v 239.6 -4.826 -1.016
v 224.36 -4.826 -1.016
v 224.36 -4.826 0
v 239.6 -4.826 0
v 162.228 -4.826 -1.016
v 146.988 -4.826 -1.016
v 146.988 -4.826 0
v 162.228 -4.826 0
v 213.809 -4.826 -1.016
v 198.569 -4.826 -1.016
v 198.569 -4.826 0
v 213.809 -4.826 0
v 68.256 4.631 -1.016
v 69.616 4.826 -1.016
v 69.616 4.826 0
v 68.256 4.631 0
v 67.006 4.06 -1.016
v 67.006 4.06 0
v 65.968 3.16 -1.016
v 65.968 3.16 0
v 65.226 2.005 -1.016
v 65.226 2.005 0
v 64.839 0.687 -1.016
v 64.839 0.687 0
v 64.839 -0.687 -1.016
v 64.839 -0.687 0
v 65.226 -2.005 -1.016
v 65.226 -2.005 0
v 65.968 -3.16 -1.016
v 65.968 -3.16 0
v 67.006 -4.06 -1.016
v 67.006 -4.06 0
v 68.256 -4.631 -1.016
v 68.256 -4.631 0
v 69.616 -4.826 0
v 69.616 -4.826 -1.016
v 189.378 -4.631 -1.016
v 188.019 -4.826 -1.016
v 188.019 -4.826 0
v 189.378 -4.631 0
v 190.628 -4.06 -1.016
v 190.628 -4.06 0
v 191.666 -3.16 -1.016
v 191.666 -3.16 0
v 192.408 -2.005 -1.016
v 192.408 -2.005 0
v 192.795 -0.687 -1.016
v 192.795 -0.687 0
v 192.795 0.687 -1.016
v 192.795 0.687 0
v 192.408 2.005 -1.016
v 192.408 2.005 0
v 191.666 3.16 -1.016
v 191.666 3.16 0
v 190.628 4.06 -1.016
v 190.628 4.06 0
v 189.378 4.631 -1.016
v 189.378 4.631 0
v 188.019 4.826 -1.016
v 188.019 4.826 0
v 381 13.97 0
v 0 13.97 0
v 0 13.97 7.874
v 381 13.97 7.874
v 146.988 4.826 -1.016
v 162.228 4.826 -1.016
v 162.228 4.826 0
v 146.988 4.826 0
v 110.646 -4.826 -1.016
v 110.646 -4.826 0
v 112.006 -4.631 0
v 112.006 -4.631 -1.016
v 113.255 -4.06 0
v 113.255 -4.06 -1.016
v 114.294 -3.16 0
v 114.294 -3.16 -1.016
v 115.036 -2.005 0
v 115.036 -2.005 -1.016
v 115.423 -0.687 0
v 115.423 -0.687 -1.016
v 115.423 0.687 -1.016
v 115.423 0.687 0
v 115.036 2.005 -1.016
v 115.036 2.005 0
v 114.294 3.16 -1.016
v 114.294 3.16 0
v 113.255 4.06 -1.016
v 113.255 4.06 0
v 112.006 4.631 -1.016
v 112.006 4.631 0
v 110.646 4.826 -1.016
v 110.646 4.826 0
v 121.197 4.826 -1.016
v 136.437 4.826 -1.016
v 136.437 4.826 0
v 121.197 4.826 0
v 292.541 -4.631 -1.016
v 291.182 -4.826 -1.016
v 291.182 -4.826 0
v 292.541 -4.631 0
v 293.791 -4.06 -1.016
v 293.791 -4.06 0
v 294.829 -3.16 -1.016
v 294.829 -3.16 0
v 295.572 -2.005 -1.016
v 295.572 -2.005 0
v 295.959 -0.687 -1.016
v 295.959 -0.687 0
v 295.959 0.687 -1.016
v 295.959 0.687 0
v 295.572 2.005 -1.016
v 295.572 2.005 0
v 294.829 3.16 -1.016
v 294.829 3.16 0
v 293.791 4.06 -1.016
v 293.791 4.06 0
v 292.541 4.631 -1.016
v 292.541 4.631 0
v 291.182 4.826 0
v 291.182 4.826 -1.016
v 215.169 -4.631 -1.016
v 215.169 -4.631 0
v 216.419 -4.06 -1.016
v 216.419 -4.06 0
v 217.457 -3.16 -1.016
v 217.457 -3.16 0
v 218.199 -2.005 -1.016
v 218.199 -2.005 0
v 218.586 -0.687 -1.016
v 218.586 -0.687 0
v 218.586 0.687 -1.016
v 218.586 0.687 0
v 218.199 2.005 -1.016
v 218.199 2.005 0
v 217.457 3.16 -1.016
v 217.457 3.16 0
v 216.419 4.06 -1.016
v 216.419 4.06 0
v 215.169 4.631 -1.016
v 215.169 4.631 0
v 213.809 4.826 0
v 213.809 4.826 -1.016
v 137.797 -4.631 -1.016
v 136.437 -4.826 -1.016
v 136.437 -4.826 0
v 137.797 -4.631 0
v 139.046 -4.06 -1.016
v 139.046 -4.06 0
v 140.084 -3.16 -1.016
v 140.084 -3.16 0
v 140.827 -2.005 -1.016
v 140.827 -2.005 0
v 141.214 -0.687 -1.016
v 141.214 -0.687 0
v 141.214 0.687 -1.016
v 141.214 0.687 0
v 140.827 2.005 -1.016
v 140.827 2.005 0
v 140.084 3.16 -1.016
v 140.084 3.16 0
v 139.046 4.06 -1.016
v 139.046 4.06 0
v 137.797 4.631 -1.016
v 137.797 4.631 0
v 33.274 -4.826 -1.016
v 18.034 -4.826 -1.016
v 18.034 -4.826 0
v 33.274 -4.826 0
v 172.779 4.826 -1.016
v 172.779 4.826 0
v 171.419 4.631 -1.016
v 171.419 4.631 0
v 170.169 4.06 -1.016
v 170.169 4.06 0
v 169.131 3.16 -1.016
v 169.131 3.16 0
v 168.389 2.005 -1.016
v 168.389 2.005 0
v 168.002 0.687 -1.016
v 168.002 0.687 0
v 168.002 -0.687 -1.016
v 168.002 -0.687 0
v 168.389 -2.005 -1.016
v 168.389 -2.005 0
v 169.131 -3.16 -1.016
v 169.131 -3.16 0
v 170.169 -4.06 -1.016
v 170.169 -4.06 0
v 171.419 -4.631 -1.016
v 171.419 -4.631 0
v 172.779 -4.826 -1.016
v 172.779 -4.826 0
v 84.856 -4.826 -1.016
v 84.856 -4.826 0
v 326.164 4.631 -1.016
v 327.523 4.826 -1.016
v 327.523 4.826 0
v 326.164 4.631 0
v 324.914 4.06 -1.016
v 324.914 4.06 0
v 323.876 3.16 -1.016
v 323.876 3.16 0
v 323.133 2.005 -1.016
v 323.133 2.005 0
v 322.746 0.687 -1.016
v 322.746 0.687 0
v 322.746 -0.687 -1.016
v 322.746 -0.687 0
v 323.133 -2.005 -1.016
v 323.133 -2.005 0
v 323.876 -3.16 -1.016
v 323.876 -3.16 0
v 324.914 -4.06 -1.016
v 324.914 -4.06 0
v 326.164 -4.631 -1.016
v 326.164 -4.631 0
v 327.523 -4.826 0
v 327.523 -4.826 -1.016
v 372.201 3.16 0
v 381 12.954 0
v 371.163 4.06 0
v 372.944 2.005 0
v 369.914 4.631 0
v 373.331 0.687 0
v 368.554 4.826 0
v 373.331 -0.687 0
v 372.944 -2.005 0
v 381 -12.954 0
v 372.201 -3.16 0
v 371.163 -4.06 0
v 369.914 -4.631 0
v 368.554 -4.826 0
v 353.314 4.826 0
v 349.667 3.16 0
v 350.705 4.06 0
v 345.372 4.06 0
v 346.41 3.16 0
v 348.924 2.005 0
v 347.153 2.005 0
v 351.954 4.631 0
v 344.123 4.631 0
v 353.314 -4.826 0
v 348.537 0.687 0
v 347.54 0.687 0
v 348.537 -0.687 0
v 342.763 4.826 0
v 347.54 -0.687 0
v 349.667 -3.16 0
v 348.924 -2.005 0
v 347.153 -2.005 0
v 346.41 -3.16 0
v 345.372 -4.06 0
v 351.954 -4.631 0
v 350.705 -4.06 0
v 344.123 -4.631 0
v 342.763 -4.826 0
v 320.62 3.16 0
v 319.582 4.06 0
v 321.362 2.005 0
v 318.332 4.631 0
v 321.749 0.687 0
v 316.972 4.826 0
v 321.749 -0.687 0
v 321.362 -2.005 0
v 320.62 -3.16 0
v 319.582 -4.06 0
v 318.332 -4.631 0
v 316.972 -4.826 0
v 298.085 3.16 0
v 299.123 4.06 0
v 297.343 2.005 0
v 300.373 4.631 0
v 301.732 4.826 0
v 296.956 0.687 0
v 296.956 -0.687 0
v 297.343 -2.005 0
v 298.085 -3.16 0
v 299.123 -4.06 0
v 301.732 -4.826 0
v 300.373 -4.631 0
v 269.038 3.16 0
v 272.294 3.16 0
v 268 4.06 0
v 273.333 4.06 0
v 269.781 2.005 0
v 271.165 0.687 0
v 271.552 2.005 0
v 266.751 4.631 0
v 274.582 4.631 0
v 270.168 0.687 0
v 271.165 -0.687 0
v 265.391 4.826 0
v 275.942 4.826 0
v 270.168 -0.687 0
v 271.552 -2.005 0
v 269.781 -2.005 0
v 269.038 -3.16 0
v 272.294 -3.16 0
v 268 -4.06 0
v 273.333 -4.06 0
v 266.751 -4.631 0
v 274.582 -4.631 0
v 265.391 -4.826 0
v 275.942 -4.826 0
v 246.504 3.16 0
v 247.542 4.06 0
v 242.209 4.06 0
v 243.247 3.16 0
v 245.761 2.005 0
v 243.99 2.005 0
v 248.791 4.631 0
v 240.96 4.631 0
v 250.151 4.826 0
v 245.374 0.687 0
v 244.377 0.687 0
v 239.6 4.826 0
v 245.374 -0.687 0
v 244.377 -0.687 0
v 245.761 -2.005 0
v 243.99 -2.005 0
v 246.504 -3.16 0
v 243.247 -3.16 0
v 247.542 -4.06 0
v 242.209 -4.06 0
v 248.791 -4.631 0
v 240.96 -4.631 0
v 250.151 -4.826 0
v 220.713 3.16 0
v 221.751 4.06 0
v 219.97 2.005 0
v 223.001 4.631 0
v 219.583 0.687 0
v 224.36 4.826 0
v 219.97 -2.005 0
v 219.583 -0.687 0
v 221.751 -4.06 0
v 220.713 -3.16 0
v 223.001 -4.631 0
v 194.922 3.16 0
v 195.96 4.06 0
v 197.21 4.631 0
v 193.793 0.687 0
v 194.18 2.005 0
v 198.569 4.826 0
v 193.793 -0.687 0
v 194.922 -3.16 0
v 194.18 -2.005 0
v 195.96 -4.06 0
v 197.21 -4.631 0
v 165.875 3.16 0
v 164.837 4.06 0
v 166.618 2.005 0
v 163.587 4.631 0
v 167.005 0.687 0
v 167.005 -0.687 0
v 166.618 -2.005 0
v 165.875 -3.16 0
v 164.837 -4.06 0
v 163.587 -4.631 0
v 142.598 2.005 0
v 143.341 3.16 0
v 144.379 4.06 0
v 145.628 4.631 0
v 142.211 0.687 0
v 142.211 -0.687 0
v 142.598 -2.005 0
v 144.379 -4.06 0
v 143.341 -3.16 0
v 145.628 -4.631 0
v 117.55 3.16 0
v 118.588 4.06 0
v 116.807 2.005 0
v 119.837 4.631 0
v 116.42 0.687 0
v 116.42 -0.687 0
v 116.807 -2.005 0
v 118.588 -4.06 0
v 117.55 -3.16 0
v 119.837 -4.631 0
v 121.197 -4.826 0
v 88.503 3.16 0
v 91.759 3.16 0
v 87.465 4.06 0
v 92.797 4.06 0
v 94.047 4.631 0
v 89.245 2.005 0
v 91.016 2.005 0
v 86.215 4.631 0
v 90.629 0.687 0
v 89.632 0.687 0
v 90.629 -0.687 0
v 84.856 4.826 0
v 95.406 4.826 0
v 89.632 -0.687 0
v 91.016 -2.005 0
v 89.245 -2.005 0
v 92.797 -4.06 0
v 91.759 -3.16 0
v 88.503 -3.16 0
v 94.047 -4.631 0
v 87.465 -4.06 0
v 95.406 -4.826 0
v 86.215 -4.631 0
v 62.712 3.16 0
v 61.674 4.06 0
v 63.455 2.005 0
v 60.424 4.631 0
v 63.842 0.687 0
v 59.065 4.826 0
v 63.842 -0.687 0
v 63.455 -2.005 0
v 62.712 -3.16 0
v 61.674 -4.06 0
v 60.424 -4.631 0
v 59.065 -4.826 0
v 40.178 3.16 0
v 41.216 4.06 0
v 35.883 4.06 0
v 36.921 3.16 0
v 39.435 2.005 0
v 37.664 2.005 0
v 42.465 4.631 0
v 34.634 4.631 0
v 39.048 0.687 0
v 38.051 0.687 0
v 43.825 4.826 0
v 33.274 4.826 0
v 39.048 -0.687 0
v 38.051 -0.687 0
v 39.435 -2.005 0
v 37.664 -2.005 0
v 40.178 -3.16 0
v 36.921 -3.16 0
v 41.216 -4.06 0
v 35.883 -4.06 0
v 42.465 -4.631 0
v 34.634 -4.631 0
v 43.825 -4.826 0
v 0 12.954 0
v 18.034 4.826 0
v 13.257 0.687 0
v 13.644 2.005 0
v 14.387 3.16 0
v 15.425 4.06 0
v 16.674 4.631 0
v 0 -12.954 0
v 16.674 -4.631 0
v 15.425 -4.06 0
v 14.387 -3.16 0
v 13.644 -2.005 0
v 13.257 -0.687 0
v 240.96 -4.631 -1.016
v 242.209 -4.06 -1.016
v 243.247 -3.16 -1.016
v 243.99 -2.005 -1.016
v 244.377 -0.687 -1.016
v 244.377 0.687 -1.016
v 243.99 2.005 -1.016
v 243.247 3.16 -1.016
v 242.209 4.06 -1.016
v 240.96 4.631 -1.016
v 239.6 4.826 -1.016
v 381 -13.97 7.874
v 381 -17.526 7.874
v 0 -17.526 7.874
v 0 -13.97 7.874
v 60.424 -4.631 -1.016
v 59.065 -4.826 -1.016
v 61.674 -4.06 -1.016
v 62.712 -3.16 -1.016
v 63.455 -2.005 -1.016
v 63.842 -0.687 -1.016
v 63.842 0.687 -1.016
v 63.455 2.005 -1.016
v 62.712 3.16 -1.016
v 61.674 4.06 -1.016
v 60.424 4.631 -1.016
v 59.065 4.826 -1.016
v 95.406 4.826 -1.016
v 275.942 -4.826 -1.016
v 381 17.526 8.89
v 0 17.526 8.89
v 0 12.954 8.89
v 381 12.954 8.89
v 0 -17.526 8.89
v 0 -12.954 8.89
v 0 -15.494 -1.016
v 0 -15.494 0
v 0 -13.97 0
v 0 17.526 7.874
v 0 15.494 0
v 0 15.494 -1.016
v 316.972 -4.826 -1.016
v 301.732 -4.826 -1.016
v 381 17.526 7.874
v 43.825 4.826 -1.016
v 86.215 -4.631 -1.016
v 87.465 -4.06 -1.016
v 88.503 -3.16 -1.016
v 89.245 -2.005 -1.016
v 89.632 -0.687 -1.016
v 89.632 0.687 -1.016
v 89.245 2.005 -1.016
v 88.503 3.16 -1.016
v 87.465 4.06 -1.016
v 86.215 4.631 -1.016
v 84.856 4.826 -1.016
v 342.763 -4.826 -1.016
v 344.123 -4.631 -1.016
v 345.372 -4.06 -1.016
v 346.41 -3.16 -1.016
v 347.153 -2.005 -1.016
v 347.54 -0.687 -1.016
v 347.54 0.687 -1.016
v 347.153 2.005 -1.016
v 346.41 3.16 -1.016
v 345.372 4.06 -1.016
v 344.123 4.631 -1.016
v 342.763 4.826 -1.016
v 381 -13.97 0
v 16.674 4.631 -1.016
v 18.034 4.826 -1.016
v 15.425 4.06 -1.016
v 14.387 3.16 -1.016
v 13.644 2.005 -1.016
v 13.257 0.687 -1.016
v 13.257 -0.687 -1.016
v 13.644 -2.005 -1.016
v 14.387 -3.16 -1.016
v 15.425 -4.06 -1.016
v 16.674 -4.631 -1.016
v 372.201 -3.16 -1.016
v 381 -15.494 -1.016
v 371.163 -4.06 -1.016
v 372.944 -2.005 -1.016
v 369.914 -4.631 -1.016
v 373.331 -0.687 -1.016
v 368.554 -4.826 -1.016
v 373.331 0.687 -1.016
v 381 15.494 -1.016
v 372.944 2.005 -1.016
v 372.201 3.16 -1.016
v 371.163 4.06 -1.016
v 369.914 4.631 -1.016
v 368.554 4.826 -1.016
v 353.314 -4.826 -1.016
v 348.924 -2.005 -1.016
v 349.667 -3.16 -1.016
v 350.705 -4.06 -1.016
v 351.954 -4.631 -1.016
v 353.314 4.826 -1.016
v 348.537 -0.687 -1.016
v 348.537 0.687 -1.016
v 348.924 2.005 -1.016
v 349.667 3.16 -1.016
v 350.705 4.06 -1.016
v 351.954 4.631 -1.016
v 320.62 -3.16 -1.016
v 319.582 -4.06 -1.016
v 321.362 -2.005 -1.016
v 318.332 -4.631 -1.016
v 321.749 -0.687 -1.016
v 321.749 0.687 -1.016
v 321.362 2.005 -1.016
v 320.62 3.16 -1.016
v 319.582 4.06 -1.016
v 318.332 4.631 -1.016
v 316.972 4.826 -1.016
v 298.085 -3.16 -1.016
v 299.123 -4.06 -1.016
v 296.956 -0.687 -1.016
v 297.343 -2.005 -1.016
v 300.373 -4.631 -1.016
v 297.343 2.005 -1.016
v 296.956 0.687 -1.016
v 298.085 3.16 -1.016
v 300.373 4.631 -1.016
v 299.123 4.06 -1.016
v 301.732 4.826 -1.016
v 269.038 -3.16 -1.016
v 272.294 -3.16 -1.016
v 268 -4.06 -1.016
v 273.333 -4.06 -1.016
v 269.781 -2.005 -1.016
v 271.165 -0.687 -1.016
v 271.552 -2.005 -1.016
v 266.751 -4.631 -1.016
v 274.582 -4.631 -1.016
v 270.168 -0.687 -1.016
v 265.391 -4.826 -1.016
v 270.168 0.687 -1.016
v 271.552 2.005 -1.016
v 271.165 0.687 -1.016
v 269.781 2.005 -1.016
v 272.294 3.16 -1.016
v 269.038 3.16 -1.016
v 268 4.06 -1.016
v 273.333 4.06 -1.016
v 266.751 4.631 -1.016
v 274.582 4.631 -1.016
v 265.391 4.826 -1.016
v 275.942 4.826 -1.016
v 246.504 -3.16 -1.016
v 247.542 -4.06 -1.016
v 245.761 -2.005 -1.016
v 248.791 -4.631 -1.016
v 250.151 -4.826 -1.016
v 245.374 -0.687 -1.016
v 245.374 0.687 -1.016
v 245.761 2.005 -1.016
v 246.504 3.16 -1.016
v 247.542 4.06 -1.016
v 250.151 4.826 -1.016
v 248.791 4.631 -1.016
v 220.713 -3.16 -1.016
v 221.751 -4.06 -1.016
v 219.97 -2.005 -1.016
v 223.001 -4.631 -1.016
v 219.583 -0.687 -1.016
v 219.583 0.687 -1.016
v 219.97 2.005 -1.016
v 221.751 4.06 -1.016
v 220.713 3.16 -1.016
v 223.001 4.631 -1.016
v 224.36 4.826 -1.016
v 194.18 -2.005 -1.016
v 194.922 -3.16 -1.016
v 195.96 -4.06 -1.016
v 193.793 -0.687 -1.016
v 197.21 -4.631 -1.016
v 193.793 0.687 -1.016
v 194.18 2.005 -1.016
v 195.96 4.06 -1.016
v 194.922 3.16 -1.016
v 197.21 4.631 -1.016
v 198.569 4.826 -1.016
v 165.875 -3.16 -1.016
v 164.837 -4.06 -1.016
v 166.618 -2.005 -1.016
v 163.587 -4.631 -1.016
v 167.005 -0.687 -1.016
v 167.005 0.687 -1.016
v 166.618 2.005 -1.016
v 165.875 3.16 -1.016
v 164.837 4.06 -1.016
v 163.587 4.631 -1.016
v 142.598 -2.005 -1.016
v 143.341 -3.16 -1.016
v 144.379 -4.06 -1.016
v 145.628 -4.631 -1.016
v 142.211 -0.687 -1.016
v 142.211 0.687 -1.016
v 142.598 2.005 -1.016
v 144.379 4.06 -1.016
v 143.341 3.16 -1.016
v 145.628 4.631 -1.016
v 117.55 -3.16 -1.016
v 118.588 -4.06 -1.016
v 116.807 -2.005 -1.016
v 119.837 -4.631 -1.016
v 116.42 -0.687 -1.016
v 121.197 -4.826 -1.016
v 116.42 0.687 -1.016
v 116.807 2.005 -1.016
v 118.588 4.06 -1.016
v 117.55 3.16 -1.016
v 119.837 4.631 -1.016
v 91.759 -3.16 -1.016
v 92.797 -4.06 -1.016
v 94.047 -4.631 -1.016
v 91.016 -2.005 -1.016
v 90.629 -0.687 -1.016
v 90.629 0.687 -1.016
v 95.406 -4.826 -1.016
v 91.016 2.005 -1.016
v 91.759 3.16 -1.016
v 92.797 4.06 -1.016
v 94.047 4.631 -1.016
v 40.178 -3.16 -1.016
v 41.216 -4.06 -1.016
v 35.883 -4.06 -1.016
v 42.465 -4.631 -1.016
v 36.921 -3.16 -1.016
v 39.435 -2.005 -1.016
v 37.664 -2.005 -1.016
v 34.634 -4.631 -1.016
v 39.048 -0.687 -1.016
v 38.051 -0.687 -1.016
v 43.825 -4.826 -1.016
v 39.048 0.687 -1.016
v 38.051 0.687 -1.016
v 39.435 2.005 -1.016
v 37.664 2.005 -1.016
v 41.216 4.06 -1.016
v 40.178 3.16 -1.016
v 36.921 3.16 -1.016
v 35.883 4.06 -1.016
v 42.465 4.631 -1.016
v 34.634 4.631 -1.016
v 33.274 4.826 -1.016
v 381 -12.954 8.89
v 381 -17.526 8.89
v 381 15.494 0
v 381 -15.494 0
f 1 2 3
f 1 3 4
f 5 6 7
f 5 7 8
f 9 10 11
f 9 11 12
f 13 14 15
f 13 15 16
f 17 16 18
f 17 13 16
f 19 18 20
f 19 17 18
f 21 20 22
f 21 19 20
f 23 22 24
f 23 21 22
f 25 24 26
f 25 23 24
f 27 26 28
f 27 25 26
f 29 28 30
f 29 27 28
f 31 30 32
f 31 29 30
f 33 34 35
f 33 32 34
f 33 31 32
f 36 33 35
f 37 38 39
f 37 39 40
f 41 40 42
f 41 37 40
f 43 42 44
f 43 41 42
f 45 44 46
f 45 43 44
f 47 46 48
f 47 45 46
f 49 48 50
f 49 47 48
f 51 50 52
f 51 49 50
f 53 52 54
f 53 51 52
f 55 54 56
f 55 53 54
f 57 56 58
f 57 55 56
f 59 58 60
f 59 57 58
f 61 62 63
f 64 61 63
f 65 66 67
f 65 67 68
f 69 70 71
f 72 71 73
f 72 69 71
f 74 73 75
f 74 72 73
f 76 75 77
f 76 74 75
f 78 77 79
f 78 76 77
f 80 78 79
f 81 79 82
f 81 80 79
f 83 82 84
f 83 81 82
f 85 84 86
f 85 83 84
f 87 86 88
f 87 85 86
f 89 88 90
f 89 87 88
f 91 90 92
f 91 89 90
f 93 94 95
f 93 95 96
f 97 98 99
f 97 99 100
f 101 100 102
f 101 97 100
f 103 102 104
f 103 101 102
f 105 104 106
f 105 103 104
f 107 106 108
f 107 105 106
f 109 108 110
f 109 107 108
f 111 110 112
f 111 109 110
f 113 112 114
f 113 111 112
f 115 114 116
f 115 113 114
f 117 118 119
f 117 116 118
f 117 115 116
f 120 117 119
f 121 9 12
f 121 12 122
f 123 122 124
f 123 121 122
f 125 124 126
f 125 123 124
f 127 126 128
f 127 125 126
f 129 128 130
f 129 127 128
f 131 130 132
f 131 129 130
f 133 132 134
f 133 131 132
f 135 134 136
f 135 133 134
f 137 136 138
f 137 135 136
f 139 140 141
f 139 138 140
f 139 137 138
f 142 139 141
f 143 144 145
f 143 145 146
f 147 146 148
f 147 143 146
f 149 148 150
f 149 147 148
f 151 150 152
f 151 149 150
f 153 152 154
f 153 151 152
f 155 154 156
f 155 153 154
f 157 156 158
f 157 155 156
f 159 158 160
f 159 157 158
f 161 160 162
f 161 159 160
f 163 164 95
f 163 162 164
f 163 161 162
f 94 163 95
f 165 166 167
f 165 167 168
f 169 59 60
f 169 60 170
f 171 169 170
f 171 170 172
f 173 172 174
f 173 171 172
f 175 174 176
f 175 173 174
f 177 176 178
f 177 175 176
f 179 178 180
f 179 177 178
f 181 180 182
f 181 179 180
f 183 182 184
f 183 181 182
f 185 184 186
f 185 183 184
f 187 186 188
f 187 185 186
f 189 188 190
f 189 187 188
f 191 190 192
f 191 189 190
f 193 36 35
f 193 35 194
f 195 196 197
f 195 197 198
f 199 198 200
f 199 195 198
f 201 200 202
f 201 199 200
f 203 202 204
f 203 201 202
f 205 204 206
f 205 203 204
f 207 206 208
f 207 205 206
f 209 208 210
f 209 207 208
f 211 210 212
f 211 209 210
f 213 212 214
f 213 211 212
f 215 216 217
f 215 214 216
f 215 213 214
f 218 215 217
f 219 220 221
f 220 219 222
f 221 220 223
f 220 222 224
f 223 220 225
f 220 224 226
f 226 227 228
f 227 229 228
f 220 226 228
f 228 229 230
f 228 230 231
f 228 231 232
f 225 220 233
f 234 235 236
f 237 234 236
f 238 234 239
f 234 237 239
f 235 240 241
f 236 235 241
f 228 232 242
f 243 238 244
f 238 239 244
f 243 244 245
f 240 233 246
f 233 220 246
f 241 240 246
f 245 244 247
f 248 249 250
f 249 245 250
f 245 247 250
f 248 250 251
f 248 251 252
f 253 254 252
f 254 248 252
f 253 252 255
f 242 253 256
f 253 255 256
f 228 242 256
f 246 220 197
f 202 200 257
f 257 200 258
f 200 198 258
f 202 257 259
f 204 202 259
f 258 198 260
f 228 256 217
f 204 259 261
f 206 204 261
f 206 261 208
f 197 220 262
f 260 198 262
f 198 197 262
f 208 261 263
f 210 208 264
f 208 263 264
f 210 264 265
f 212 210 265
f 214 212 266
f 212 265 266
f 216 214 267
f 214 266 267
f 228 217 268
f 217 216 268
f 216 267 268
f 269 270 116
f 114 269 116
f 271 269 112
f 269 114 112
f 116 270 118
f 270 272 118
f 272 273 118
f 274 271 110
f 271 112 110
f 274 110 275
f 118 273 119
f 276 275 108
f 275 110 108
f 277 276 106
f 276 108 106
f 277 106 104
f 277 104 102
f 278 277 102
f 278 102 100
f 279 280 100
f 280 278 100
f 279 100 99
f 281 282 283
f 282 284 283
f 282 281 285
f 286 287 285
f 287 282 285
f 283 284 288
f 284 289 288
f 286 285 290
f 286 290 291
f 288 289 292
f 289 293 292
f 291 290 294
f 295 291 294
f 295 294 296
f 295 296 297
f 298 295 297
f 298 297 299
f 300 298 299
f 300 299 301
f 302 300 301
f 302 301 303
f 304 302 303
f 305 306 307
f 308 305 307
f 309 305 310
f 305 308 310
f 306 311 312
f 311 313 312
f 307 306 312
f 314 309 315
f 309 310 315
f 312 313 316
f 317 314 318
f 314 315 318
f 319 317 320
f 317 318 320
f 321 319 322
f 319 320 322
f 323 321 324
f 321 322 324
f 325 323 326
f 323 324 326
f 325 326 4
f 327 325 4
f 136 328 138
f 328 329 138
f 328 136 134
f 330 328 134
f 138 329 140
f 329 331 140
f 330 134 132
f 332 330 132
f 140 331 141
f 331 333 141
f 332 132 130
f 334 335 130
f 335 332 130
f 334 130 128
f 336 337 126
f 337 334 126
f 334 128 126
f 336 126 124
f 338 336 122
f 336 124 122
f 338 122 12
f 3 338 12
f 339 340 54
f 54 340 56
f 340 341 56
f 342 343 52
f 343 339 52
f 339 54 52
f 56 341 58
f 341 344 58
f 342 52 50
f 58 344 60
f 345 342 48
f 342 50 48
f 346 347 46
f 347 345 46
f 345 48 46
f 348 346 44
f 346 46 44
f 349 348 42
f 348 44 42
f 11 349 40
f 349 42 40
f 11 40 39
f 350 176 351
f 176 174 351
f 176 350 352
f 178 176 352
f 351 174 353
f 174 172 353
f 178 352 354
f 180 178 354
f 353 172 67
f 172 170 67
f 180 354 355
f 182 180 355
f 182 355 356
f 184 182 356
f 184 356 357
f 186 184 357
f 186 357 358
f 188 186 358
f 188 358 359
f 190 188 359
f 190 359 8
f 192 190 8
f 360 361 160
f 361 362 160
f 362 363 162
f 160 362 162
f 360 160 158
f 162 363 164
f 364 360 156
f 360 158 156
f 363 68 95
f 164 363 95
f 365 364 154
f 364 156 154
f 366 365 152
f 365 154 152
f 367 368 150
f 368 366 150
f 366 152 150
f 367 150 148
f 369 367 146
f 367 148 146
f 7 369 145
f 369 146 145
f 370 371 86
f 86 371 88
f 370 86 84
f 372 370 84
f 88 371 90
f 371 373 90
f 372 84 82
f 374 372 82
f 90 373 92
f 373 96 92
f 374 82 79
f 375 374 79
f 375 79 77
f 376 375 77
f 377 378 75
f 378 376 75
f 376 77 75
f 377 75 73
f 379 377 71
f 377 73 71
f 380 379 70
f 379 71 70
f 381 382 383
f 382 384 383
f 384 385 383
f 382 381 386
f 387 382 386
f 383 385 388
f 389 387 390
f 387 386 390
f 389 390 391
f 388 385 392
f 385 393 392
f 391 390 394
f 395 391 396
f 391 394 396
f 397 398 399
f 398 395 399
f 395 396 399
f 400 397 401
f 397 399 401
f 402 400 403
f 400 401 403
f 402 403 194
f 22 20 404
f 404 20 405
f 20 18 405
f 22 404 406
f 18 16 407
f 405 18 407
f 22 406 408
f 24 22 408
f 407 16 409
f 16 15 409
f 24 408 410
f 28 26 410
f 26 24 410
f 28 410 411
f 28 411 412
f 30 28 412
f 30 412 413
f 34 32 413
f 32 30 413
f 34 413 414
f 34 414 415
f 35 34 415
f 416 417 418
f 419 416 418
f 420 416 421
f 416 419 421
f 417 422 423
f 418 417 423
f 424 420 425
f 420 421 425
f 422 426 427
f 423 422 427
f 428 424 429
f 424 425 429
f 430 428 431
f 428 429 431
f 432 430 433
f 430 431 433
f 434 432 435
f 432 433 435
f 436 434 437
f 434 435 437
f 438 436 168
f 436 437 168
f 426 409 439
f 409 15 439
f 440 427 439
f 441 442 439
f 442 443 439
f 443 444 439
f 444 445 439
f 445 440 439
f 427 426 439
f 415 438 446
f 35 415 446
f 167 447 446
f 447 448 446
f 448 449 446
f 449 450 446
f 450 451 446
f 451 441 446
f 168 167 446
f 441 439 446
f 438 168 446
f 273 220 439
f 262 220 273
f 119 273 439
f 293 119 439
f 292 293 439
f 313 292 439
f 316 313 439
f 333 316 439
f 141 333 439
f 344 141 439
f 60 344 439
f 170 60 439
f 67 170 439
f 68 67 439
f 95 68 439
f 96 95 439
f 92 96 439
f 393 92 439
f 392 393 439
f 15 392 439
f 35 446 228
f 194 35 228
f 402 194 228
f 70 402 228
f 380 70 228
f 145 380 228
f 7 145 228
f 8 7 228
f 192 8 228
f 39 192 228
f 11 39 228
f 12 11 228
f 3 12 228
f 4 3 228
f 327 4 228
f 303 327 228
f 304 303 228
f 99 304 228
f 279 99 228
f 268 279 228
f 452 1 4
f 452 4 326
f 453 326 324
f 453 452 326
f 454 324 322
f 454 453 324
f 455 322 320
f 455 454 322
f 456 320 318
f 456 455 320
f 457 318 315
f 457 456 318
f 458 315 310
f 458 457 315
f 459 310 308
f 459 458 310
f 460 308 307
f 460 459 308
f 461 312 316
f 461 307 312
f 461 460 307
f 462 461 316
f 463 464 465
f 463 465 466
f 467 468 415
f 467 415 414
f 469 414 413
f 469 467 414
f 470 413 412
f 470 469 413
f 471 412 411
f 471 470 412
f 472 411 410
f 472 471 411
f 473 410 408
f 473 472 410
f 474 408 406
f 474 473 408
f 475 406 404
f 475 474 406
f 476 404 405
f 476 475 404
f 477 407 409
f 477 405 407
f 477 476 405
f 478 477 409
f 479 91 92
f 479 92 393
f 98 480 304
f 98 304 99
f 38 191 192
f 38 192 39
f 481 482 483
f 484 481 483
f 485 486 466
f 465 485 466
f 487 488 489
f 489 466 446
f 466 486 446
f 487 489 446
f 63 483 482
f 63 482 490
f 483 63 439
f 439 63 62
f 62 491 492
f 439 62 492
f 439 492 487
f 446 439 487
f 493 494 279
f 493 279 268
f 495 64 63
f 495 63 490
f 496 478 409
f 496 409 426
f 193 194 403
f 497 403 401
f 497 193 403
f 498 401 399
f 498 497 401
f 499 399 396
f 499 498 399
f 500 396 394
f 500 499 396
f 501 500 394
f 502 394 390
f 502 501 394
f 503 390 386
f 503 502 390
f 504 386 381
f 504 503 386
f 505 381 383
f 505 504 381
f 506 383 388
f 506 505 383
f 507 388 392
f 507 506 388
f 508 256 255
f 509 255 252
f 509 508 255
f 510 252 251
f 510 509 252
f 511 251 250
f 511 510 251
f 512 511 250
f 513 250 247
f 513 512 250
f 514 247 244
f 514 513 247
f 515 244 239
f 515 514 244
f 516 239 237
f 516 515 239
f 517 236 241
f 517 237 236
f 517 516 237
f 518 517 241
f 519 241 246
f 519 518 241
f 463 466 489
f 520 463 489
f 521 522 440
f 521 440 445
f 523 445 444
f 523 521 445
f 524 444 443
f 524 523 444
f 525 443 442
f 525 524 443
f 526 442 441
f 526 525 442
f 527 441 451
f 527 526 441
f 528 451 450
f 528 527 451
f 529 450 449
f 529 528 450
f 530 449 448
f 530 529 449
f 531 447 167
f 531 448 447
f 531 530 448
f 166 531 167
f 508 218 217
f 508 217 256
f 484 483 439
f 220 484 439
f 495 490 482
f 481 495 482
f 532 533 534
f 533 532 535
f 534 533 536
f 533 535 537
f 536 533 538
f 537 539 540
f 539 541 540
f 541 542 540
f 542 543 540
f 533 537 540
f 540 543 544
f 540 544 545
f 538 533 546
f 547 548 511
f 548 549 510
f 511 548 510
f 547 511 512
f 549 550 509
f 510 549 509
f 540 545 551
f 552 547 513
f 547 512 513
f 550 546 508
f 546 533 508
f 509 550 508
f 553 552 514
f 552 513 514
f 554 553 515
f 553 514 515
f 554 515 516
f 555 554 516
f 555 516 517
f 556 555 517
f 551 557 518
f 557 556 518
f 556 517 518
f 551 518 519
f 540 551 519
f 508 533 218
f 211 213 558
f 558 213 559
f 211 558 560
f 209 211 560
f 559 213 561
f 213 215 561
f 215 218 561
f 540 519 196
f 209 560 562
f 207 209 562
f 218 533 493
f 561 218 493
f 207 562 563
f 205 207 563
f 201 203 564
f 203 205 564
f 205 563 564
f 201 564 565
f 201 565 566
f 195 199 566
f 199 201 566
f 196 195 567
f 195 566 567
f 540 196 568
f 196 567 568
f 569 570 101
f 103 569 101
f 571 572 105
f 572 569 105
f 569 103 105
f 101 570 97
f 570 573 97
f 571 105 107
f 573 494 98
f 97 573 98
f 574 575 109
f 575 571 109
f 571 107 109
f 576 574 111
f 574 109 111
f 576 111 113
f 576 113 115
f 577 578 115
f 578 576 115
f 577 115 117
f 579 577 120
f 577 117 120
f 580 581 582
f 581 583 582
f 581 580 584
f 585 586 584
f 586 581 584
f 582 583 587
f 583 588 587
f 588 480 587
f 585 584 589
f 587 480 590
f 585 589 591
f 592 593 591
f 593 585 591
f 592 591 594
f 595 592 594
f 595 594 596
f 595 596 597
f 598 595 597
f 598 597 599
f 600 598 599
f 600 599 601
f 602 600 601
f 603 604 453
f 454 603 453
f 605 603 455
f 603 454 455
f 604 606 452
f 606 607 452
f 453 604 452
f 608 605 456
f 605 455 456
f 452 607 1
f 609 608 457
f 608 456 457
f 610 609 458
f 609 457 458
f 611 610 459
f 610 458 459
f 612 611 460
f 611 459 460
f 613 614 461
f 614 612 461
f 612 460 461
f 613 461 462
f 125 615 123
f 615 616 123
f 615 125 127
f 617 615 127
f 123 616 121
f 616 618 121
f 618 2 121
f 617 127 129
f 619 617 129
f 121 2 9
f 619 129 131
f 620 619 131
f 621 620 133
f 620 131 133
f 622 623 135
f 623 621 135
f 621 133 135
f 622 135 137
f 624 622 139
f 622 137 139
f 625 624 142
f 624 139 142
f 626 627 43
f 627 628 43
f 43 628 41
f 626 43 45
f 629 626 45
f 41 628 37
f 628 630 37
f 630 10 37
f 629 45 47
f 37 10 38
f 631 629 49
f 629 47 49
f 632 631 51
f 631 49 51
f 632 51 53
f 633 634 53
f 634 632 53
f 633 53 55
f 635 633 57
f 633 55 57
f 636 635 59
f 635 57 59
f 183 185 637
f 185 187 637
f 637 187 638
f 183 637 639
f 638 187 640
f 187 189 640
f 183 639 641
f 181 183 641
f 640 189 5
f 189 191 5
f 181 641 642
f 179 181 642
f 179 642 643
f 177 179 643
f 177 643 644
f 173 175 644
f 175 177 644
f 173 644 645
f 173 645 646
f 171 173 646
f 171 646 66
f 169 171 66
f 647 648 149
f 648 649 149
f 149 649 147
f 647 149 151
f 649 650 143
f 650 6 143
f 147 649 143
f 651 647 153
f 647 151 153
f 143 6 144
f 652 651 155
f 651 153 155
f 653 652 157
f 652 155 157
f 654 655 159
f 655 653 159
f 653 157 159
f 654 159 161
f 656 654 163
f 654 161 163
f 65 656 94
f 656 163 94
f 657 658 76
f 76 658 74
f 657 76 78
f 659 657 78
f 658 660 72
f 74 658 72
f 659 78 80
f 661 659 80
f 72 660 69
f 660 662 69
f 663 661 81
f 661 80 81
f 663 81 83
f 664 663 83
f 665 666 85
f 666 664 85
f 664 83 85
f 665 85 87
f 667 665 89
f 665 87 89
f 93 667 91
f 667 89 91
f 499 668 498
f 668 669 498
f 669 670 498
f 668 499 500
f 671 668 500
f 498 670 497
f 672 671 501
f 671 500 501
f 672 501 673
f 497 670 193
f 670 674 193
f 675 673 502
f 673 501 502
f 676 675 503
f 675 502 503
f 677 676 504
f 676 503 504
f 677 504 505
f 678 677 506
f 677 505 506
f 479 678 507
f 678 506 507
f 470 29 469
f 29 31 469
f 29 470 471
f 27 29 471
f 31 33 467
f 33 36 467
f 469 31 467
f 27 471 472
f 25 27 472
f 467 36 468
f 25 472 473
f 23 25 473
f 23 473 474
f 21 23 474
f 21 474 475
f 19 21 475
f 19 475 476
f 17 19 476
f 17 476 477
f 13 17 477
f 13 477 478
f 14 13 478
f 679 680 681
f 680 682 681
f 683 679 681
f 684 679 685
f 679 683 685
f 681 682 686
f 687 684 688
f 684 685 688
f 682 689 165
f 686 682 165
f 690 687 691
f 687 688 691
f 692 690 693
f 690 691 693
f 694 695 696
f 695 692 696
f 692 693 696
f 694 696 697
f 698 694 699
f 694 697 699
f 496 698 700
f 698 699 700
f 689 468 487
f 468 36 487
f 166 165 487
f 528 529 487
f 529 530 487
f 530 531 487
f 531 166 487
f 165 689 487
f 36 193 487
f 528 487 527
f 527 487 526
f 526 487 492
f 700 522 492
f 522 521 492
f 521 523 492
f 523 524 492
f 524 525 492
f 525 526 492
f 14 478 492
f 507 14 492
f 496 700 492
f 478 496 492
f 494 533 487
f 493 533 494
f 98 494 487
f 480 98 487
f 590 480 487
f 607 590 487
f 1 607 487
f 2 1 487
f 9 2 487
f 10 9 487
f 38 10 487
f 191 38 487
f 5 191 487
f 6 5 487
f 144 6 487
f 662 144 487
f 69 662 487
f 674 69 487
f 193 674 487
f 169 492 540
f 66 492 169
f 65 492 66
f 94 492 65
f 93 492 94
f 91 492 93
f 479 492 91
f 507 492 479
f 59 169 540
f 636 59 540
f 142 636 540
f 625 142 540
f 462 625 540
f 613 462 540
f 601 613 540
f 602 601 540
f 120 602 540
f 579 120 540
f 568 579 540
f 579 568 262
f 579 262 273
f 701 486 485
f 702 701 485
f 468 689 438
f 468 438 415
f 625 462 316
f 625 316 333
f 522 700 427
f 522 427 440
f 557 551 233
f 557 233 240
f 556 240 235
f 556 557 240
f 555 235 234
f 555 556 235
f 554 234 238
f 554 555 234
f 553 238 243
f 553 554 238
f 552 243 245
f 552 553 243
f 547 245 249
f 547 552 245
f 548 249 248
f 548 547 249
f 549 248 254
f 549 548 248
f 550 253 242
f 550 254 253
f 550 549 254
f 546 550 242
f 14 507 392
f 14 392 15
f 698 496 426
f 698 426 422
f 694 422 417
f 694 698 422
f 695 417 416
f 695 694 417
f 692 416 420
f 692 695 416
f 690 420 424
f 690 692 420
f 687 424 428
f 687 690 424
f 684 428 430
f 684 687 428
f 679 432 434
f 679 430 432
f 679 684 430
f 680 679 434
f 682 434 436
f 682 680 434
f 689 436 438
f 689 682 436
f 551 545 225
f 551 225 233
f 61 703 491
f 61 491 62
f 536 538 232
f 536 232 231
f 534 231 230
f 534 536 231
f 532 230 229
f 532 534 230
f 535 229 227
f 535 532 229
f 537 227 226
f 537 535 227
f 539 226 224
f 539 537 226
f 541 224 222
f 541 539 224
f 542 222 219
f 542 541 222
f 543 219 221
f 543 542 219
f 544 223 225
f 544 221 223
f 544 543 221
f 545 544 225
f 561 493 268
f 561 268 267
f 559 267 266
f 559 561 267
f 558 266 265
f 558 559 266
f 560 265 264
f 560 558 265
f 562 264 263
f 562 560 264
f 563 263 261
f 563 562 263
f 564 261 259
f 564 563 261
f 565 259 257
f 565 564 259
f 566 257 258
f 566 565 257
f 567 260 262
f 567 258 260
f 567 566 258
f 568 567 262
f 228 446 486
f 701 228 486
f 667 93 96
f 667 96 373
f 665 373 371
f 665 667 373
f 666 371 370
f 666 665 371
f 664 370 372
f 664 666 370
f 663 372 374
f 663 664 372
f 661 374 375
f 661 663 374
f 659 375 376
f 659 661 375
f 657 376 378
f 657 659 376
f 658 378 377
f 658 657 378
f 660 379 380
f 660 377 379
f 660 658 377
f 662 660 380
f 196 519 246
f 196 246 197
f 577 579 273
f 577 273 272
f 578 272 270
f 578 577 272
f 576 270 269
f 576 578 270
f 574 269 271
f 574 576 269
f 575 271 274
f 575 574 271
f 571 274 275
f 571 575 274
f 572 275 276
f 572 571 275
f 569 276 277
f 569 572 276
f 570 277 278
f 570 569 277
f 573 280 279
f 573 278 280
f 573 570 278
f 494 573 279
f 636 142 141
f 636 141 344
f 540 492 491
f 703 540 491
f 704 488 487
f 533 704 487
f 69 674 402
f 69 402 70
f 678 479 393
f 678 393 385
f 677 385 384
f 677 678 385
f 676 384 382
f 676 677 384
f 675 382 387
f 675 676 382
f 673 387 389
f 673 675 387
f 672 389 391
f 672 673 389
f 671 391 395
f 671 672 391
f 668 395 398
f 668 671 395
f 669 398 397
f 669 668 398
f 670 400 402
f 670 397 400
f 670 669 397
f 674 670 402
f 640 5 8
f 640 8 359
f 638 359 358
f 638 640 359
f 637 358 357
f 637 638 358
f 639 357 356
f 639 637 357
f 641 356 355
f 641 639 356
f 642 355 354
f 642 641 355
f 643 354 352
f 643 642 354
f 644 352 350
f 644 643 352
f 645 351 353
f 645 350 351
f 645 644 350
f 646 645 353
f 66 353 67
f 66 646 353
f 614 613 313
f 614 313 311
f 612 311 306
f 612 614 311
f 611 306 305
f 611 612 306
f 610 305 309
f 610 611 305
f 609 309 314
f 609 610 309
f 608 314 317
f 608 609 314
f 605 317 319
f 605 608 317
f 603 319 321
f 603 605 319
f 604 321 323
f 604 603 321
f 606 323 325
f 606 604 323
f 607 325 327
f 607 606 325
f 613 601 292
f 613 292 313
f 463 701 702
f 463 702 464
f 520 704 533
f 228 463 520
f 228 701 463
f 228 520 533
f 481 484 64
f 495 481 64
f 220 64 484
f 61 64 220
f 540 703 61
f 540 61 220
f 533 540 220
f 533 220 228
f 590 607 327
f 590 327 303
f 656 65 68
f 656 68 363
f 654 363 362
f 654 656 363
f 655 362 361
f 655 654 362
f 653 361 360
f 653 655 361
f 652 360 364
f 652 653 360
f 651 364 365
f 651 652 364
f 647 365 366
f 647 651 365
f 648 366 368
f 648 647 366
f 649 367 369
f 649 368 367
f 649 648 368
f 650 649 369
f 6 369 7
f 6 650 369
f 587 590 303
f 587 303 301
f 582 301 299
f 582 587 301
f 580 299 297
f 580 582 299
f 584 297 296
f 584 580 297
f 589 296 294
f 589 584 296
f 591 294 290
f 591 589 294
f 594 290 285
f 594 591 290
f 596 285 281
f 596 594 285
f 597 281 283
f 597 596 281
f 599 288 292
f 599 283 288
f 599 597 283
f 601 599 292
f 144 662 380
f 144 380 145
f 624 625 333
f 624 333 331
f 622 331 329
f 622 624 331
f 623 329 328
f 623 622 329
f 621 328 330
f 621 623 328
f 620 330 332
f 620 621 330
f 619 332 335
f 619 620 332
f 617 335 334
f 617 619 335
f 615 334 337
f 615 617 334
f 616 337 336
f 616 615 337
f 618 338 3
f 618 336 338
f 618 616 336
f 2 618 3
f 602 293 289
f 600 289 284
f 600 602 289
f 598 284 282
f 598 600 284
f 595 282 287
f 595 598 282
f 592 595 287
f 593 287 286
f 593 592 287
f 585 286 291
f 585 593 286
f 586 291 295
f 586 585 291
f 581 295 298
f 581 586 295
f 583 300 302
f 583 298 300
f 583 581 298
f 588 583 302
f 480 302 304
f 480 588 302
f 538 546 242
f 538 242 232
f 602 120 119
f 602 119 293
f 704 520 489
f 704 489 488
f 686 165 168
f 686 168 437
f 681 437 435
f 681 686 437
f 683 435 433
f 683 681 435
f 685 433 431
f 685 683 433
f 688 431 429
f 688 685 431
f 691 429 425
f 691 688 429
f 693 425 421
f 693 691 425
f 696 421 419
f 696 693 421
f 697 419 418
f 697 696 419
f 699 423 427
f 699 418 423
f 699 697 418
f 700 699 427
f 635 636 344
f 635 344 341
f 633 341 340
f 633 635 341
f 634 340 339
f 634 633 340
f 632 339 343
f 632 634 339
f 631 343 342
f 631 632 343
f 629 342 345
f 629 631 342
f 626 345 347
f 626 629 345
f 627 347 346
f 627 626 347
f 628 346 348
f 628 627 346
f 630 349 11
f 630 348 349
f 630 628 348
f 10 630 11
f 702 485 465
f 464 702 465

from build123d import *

# Parameters (mm, degrees)
BOSS_EXTRUDE1_DEPTH = 381
CUT_EXTRUDE1_DEPTH  = 382.531505268


with BuildPart() as part:
    # Sketch1 → Boss-Extrude1 (new body)
    with BuildSketch(Plane(origin=(0, 0, 0), x_dir=(0, 0, -1), z_dir=(1, 0, 0))):
        Polygon((0, 12.954), (0, -12.954), (-8.89, -12.954), (-8.89, -17.526), (-7.874, -17.526), (-7.874, -13.97), (0, -13.97), (0, -15.494), (1.016, -15.494), (1.016, 15.494), (0, 15.494), (0, 13.97), (-7.874, 13.97), (-7.874, 17.526), (-8.89, 17.526), (-8.89, 12.954), align=None)
    extrude(amount=BOSS_EXTRUDE1_DEPTH)

    # Sketch2 → Cut-Extrude1 (cut, through all)
    with BuildSketch(Plane(origin=(0, 0, -1.016), x_dir=(-1, 0, 0), z_dir=(0, 0, -1))):
        with BuildLine():
            Line((-368.554, 4.826), (-353.314, 4.826))
            ThreePointArc((-353.314, 4.826), (-348.488, 0), (-353.314, -4.826))
            Line((-353.314, -4.826), (-368.554, -4.826))
            ThreePointArc((-368.554, -4.826), (-373.38, 0), (-368.554, 4.826))
        make_face()
        with BuildLine():
            Line((-342.763230769, 4.826), (-327.523230769, 4.826))
            ThreePointArc((-327.523230769, 4.826), (-322.697230769, 0), (-327.523230769, -4.826))
            Line((-327.523230769, -4.826), (-342.763230769, -4.826))
            ThreePointArc((-342.763230769, -4.826), (-347.589230769, 0), (-342.763230769, 4.826))
        make_face()
        with BuildLine():
            Line((-316.972461538, 4.826), (-301.732461538, 4.826))
            ThreePointArc((-301.732461538, 4.826), (-296.906461538, 0), (-301.732461538, -4.826))
            Line((-301.732461538, -4.826), (-316.972461538, -4.826))
            ThreePointArc((-316.972461538, -4.826), (-321.798461538, 0), (-316.972461538, 4.826))
        make_face()
        with BuildLine():
            Line((-291.181692308, 4.826), (-275.941692308, 4.826))
            ThreePointArc((-275.941692308, 4.826), (-271.115692308, 0), (-275.941692308, -4.826))
            Line((-275.941692308, -4.826), (-291.181692308, -4.826))
            ThreePointArc((-291.181692308, -4.826), (-296.007692308, 0), (-291.181692308, 4.826))
        make_face()
        with BuildLine():
            Line((-265.390923077, 4.826), (-250.150923077, 4.826))
            ThreePointArc((-250.150923077, 4.826), (-245.324923077, 0), (-250.150923077, -4.826))
            Line((-250.150923077, -4.826), (-265.390923077, -4.826))
            ThreePointArc((-265.390923077, -4.826), (-270.216923077, 0), (-265.390923077, 4.826))
        make_face()
        with BuildLine():
            Line((-239.600153846, 4.826), (-224.360153846, 4.826))
            ThreePointArc((-224.360153846, 4.826), (-219.534153846, 0), (-224.360153846, -4.826))
            Line((-224.360153846, -4.826), (-239.600153846, -4.826))
            ThreePointArc((-239.600153846, -4.826), (-244.426153846, 0), (-239.600153846, 4.826))
        make_face()
        with BuildLine():
            Line((-213.809384615, 4.826), (-198.569384615, 4.826))
            ThreePointArc((-198.569384615, 4.826), (-193.743384615, 0), (-198.569384615, -4.826))
            Line((-198.569384615, -4.826), (-213.809384615, -4.826))
            ThreePointArc((-213.809384615, -4.826), (-218.635384615, 0), (-213.809384615, 4.826))
        make_face()
        with BuildLine():
            Line((-188.018615385, 4.826), (-172.778615385, 4.826))
            ThreePointArc((-172.778615385, 4.826), (-167.952615385, 0), (-172.778615385, -4.826))
            Line((-172.778615385, -4.826), (-188.018615385, -4.826))
            ThreePointArc((-188.018615385, -4.826), (-192.844615385, 0), (-188.018615385, 4.826))
        make_face()
        with BuildLine():
            Line((-162.227846154, 4.826), (-146.987846154, 4.826))
            ThreePointArc((-146.987846154, 4.826), (-142.161846154, 0), (-146.987846154, -4.826))
            Line((-146.987846154, -4.826), (-162.227846154, -4.826))
            ThreePointArc((-162.227846154, -4.826), (-167.053846154, 0), (-162.227846154, 4.826))
        make_face()
        with BuildLine():
            Line((-136.437076923, 4.826), (-121.197076923, 4.826))
            ThreePointArc((-121.197076923, 4.826), (-116.371076923, 0), (-121.197076923, -4.826))
            Line((-121.197076923, -4.826), (-136.437076923, -4.826))
            ThreePointArc((-136.437076923, -4.826), (-141.263076923, 0), (-136.437076923, 4.826))
        make_face()
        with BuildLine():
            Line((-110.646307692, 4.826), (-95.406307692, 4.826))
            ThreePointArc((-95.406307692, 4.826), (-90.580307692, 0), (-95.406307692, -4.826))
            Line((-95.406307692, -4.826), (-110.646307692, -4.826))
            ThreePointArc((-110.646307692, -4.826), (-115.472307692, 0), (-110.646307692, 4.826))
        make_face()
        with BuildLine():
            Line((-84.855538462, 4.826), (-69.615538462, 4.826))
            ThreePointArc((-69.615538462, 4.826), (-64.789538462, 0), (-69.615538462, -4.826))
            Line((-69.615538462, -4.826), (-84.855538462, -4.826))
            ThreePointArc((-84.855538462, -4.826), (-89.681538462, 0), (-84.855538462, 4.826))
        make_face()
        with BuildLine():
            Line((-59.064769231, 4.826), (-43.824769231, 4.826))
            ThreePointArc((-43.824769231, 4.826), (-38.998769231, 0), (-43.824769231, -4.826))
            Line((-43.824769231, -4.826), (-59.064769231, -4.826))
            ThreePointArc((-59.064769231, -4.826), (-63.890769231, 0), (-59.064769231, 4.826))
        make_face()
        with BuildLine():
            Line((-33.274, 4.826), (-18.034, 4.826))
            ThreePointArc((-18.034, 4.826), (-13.208, 0), (-18.034, -4.826))
            Line((-18.034, -4.826), (-33.274, -4.826))
            ThreePointArc((-33.274, -4.826), (-38.1, 0), (-33.274, 4.826))
        make_face()
    extrude(amount=-CUT_EXTRUDE1_DEPTH, mode=Mode.SUBTRACT)


solid = part.part
